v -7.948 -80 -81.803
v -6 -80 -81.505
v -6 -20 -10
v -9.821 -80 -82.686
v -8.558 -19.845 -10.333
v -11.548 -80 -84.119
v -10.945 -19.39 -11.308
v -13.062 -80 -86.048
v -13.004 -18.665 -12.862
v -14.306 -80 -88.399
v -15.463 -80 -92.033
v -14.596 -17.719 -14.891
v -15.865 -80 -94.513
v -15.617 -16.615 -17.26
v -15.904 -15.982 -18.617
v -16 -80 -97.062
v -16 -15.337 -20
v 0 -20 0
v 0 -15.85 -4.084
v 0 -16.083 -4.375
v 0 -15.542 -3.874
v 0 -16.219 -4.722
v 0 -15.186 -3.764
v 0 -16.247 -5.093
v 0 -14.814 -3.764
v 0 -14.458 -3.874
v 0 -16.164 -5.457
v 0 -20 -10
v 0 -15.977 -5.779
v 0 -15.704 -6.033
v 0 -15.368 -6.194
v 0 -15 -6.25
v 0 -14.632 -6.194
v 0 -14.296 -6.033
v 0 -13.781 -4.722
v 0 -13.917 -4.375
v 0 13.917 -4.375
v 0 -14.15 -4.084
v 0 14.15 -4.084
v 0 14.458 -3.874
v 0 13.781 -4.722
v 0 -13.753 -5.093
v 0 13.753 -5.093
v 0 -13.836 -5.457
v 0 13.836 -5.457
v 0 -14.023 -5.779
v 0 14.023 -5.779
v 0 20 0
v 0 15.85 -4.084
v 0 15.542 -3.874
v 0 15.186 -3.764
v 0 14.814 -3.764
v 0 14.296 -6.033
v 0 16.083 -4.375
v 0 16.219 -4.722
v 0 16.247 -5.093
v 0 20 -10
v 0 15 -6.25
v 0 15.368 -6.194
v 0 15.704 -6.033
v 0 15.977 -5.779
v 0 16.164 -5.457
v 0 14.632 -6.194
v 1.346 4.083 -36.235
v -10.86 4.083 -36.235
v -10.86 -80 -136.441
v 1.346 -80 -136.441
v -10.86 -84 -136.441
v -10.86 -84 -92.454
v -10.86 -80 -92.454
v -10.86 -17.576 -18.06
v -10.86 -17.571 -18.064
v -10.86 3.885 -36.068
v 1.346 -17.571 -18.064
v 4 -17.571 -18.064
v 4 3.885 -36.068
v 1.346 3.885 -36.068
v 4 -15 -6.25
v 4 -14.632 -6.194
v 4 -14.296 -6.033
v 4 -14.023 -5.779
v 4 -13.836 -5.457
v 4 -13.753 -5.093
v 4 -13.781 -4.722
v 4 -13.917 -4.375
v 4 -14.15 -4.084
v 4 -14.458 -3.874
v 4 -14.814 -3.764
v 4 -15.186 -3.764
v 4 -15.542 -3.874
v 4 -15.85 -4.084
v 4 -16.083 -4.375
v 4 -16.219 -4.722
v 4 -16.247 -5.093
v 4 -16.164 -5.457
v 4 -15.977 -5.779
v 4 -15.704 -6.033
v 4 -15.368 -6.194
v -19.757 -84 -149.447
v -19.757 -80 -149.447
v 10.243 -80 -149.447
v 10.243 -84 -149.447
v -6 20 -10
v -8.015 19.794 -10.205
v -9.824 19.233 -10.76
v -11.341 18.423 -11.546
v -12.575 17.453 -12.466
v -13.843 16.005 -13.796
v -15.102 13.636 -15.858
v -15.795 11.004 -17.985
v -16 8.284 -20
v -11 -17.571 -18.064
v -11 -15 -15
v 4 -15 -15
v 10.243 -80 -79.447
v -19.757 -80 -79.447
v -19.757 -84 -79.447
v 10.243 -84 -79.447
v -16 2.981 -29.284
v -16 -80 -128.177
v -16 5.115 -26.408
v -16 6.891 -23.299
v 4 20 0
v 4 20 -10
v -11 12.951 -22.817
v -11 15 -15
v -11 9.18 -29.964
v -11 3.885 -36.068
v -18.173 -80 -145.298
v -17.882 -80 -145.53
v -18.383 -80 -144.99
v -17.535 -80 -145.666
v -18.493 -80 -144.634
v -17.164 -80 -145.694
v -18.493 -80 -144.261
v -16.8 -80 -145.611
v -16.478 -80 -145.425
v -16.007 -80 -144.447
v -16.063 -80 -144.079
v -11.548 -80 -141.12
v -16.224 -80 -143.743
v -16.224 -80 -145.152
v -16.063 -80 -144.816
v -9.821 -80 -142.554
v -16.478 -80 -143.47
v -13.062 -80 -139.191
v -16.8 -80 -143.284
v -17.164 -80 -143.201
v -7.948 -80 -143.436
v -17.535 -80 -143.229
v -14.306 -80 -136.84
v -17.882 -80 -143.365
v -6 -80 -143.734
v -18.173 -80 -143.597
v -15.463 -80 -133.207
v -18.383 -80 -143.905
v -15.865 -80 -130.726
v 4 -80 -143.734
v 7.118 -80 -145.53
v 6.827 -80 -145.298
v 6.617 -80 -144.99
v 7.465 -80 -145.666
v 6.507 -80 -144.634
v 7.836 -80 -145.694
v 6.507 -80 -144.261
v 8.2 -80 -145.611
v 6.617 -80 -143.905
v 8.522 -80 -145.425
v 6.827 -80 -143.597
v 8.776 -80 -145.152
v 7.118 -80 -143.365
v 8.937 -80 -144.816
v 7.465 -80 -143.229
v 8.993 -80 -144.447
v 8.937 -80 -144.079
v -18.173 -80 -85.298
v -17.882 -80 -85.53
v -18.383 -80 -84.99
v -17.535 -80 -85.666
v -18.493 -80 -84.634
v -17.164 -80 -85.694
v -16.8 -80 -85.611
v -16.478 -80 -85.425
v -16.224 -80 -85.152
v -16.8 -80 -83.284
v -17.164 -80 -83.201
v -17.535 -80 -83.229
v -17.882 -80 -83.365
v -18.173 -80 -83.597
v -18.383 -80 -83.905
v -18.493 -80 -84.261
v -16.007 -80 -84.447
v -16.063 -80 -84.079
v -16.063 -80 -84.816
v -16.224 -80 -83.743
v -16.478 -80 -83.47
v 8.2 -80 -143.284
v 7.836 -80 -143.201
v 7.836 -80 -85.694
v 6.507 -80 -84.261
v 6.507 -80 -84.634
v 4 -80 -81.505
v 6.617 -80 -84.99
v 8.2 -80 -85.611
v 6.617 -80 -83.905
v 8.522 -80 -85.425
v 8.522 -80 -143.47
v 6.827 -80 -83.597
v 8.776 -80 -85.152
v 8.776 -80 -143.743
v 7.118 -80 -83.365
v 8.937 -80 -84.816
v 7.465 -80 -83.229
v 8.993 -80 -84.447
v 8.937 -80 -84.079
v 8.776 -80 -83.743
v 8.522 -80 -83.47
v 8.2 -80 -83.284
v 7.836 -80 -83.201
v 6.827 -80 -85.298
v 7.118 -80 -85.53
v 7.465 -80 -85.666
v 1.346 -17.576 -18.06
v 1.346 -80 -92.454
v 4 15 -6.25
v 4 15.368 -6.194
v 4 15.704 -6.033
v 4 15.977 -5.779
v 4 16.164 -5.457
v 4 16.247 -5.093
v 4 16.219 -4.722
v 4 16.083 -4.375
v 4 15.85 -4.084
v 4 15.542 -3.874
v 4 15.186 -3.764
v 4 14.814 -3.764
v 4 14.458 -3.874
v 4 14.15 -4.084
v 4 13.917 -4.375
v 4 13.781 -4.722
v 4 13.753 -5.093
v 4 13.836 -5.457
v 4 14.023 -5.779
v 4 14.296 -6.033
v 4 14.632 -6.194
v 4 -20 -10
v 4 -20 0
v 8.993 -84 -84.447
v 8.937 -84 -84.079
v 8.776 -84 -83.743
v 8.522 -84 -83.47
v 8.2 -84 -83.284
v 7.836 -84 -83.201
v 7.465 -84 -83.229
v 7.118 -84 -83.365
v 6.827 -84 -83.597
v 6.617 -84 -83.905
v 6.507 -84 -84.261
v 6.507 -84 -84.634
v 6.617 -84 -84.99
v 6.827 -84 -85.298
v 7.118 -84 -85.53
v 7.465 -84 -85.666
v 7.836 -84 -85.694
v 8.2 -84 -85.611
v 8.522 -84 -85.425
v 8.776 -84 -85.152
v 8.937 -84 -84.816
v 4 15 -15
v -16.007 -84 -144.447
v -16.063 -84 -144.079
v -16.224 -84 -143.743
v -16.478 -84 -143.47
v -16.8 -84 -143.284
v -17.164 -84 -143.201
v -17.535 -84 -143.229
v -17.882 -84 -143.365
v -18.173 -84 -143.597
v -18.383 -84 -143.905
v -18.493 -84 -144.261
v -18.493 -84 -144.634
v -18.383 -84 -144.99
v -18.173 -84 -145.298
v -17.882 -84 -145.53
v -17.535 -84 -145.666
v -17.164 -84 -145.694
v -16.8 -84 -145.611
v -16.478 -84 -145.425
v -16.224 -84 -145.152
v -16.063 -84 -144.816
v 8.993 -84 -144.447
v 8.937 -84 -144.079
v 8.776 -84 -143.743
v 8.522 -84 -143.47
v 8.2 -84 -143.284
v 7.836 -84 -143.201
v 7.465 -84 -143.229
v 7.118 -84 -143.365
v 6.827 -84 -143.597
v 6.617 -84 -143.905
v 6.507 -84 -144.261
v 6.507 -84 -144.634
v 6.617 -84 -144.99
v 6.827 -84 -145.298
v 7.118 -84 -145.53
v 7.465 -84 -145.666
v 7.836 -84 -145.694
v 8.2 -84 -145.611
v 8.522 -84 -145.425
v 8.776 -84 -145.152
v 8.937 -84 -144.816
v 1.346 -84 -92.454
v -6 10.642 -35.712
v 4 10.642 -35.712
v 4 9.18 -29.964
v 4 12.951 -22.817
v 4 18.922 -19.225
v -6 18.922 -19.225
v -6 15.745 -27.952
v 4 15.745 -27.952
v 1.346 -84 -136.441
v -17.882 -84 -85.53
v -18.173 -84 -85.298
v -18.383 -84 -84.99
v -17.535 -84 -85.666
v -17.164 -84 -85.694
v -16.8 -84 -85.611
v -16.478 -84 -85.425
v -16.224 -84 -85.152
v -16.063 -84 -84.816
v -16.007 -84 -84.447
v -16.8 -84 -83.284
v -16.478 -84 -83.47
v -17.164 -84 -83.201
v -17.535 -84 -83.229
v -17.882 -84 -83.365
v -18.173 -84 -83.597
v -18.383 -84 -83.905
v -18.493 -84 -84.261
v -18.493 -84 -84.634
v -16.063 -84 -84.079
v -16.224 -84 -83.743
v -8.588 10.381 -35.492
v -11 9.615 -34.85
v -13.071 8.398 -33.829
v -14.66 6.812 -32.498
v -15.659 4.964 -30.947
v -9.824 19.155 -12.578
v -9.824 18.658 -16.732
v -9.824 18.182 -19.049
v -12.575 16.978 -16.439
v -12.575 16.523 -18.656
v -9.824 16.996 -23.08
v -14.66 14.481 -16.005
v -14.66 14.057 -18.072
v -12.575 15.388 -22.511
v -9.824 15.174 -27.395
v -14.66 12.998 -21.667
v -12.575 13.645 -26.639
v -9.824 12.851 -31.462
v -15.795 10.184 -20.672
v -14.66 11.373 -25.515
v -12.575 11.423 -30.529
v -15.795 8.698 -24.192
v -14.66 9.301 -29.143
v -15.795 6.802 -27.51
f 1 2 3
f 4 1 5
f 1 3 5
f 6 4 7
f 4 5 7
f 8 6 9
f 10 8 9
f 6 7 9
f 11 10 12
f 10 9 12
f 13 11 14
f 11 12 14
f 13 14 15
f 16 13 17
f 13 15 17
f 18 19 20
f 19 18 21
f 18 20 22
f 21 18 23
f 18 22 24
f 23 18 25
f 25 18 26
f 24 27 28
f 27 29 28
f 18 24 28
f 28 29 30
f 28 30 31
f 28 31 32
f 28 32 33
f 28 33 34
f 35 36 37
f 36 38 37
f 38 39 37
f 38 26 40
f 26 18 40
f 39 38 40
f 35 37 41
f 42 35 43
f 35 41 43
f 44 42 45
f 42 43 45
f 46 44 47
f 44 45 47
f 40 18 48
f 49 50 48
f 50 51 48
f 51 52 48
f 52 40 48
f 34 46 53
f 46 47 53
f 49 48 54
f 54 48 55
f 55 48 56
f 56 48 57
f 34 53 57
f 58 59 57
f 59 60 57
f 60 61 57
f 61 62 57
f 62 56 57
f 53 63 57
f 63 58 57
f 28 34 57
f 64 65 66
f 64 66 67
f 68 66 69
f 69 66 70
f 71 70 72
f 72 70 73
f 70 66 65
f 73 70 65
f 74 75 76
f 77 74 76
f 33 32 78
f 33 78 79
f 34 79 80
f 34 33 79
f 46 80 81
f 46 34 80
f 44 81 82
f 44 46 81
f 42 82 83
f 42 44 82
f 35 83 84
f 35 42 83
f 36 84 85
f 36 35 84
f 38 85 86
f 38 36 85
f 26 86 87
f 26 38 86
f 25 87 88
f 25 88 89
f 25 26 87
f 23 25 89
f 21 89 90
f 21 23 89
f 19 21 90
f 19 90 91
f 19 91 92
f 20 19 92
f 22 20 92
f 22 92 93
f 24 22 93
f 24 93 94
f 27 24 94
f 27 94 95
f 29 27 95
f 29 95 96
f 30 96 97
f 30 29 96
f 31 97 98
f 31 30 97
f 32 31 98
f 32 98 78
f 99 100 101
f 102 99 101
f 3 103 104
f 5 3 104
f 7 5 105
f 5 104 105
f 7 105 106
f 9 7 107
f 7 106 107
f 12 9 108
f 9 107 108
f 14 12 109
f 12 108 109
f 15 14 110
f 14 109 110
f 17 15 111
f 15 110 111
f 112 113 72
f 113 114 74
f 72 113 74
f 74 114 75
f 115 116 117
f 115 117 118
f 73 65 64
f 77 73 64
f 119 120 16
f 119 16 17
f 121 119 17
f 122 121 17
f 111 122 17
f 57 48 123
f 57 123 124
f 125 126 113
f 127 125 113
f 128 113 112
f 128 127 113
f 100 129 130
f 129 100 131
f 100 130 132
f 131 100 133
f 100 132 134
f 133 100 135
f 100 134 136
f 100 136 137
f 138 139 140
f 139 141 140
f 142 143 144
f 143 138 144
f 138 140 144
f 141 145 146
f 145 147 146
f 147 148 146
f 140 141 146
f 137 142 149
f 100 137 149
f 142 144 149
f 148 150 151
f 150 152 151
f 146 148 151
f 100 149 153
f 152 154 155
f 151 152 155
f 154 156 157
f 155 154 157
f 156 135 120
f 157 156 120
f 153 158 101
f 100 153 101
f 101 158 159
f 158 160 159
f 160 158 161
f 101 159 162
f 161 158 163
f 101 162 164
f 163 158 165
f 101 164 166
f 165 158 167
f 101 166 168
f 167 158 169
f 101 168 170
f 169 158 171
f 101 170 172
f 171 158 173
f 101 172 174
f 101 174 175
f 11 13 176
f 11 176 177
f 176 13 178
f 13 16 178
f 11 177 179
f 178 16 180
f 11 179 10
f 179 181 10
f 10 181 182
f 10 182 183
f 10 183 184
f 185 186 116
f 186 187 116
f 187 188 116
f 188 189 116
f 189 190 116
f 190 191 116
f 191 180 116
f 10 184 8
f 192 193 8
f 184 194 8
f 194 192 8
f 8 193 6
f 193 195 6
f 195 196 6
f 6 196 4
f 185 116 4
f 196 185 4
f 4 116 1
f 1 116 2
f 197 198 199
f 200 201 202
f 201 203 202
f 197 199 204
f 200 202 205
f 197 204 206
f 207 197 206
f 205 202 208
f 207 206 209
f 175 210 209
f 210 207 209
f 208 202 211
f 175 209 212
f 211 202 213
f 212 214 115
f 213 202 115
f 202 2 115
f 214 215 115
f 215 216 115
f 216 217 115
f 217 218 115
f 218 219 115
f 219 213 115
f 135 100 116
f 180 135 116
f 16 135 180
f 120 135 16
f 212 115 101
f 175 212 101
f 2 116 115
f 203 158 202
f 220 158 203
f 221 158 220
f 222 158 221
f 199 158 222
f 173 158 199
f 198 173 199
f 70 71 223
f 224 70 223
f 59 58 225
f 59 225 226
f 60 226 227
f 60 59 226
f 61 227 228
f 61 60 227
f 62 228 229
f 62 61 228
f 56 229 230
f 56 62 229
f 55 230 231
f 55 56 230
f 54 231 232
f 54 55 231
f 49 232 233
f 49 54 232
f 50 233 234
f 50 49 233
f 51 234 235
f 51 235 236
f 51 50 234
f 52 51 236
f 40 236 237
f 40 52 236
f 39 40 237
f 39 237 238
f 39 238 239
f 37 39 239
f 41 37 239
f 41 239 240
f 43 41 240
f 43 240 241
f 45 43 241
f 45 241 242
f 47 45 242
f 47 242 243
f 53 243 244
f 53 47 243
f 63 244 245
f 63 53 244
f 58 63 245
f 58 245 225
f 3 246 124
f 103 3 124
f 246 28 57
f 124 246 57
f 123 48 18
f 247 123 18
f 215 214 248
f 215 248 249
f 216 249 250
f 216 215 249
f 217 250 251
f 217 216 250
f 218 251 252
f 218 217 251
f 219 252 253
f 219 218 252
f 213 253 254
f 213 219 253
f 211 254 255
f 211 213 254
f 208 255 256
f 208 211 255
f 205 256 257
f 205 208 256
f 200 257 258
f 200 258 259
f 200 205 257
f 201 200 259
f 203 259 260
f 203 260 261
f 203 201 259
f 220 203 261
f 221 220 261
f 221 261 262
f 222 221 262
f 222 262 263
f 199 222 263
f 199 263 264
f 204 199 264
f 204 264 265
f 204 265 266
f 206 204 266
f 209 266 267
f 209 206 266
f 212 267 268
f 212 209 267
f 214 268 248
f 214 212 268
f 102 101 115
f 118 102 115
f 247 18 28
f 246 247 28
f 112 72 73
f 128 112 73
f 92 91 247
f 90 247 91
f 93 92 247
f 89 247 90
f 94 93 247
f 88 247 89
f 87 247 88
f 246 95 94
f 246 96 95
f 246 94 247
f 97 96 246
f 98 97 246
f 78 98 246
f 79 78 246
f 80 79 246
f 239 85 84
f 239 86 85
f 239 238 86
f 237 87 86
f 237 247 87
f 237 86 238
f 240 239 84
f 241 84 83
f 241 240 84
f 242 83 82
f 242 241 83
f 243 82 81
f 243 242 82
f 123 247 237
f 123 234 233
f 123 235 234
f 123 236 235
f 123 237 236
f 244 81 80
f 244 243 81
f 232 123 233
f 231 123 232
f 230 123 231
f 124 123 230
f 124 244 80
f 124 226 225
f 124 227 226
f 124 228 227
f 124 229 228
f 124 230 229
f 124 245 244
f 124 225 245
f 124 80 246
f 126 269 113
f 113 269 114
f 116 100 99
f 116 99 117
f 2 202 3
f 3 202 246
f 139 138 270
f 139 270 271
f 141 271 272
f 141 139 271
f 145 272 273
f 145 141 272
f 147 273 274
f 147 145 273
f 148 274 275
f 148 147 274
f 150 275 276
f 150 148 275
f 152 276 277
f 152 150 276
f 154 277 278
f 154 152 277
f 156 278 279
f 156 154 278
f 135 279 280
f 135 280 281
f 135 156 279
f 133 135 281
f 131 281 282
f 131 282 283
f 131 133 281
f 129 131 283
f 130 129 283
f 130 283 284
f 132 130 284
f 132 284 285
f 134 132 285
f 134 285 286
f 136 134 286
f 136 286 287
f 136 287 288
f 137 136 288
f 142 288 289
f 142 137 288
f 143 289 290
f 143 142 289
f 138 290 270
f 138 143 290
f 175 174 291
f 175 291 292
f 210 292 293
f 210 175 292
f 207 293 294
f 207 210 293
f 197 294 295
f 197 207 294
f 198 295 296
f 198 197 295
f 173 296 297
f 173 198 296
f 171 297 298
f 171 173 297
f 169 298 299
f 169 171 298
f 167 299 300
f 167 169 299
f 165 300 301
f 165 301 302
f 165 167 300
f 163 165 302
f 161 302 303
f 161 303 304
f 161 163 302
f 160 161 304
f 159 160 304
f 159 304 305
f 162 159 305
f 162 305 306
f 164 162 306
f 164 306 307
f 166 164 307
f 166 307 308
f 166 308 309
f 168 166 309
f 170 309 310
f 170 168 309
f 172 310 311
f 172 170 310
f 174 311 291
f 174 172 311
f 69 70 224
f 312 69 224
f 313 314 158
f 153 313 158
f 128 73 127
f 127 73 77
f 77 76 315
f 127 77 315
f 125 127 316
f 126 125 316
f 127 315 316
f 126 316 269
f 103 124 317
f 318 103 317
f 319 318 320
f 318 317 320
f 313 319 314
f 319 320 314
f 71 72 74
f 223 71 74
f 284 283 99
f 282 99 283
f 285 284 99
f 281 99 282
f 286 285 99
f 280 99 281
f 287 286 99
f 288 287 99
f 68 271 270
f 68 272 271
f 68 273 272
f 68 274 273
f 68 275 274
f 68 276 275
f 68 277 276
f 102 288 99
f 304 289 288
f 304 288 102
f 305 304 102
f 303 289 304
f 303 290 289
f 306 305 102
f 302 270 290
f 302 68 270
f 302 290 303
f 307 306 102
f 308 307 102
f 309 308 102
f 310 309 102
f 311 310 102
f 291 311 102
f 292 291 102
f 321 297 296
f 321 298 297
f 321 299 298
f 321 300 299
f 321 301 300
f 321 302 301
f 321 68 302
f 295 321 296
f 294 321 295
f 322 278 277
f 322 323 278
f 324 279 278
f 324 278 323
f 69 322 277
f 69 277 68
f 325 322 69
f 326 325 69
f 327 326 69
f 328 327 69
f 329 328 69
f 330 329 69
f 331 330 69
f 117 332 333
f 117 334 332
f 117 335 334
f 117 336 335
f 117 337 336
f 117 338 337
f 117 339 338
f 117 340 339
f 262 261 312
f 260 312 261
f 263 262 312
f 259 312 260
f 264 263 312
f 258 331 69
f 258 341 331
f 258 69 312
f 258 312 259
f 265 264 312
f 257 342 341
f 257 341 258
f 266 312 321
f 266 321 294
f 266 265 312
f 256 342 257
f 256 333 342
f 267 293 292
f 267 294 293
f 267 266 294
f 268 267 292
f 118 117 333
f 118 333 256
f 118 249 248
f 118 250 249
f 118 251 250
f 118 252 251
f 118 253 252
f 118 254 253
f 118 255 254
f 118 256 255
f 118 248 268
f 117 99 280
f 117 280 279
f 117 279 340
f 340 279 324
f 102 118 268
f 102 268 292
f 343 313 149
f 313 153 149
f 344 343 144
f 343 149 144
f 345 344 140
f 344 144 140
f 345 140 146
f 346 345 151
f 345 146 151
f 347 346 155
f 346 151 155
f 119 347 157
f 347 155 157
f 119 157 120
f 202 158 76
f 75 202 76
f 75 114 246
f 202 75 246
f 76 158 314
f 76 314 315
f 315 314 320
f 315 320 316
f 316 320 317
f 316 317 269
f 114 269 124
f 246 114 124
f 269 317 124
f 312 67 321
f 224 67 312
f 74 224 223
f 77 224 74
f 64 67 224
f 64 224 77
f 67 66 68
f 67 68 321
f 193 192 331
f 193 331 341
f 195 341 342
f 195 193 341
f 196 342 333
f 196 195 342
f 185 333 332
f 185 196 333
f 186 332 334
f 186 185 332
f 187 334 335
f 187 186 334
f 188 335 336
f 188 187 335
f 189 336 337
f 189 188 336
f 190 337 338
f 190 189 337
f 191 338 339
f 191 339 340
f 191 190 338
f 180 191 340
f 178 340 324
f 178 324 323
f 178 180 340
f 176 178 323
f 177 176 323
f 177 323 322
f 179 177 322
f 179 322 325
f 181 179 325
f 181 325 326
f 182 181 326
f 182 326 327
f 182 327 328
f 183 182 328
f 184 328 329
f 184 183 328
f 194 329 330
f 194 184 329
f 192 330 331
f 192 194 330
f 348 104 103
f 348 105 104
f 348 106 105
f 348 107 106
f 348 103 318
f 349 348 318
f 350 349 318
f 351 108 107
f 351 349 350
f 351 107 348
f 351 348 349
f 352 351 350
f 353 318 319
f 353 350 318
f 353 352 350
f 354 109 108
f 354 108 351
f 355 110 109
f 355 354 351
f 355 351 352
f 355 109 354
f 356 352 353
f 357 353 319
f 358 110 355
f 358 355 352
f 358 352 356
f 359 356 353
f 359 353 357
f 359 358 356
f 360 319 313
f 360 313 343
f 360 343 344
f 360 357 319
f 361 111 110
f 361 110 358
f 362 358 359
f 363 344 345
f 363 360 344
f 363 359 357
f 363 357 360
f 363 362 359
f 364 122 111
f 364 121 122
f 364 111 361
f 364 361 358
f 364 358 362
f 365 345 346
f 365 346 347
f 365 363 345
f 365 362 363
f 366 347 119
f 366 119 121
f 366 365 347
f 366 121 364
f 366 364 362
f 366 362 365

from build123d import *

# Parameters (mm, degrees)
SKETCH1_W           = 10
SKETCH1_H           = 20
SKETCH1_R           = 1.25
BOSS_EXTRUDE1_DEPTH = 4
BOSS_EXTRUDE2_DEPTH = 20
FILLET2_R           = 10
SKETCH3_R           = 1.25
CUT_EXTRUDE1_DEPTH  = 15
SKETCH4_W           = 12.205542936
SKETCH4_H           = 28.274710975
CUT_EXTRUDE2_DEPTH  = 137.397289148
SKETCH5_W           = 30
SKETCH5_H           = 70
SKETCH5_R           = 1.25
SKETCH5_W_2         = 12.205542936
SKETCH5_H_2         = 43.987641562
BOSS_EXTRUDE3_DEPTH = 4


with BuildPart() as part:
    # Sketch1 → Boss-Extrude1 (new body)
    with BuildSketch(Plane(origin=(0, 0, 0), x_dir=(0, 0, -1), z_dir=(1, 0, 0))):
        with Locations((5, -10)):
            Rectangle(SKETCH1_W, SKETCH1_H)
        with Locations((5, -15)):
            Circle(SKETCH1_R, mode=Mode.SUBTRACT)
        with Locations((5, 10)):
            Rectangle(SKETCH1_W, SKETCH1_H)
        with Locations((5, 15)):
            Circle(SKETCH1_R, mode=Mode.SUBTRACT)
    extrude(amount=BOSS_EXTRUDE1_DEPTH)


with BuildPart() as body_2:
    # Sketch2 → Boss-Extrude2 (new body)
    with BuildSketch(Plane(origin=(4, 0, 0), x_dir=(0, 0, -1), z_dir=(1, 0, 0))):
        with BuildLine():
            ThreePointArc((10, 20), (23.680805733, 17.587704831), (35.711504387, 10.641777725))
            Line((35.711504387, 10.641777725), (143.73416863, -80))
            Line((143.73416863, -80), (81.505215556, -80))
            Line((81.505215556, -80), (10, -20))
            Line((10, -20), (10, 20))
        make_face()
    extrude(amount=-BOSS_EXTRUDE2_DEPTH)

    # Fillet2
    fillet2_edges = [body_2.edges().sort_by_distance(p)[0] for p in [
        (-16, 0, -10),
        (-16, -50, -45.752607778),
        (-16, -34.679111138, -89.722836509),
        (-16, 17.587704831, -23.680805733),
    ]]
    fillet(fillet2_edges, radius=FILLET2_R)

    # Sketch3 → Cut-Extrude1 (cut)
    with BuildSketch(Plane(origin=(4, 0, 0), x_dir=(0, 0, -1), z_dir=(1, 0, 0))):
        with Locations((5, -15)):
            Circle(SKETCH3_R)
        with Locations((5, 15)):
            Circle(SKETCH3_R)
        with BuildLine():
            Line((15, 15), (15, -15))
            Line((15, -15), (18.064177772, -17.571150439))
            Line((18.064177772, -17.571150439), (36.067703055, 3.884615497))
            ThreePointArc((36.067703055, 3.884615497), (26.498135848, 11.269977831), (15, 15))
        make_face()
    extrude(amount=-CUT_EXTRUDE1_DEPTH, mode=Mode.SUBTRACT)

    # Sketch4 → Cut-Extrude2 (cut, through all)
    with BuildSketch(Plane(origin=(0, -16.154847254, -19.252597253), x_dir=(1, 0, 0), z_dir=(0, 0.64278761, 0.766044443))):
        with Locations((-4.757097635, 12.281851889)):
            Rectangle(SKETCH4_W, SKETCH4_H)
    extrude(amount=-CUT_EXTRUDE2_DEPTH, mode=Mode.SUBTRACT)

    # Sketch5 → Boss-Extrude3 (add)
    with BuildSketch(Plane.XZ.offset(80)):
        with Locations((-4.757097635, -114.447457028)):
            Rectangle(SKETCH5_W, SKETCH5_H)
        with Locations((-17.257097635, -84.447457028)):
            Circle(SKETCH5_R, mode=Mode.SUBTRACT)
        with Locations((7.742902365, -84.447457028)):
            Circle(SKETCH5_R, mode=Mode.SUBTRACT)
        with Locations((7.742902365, -144.447457028)):
            Circle(SKETCH5_R, mode=Mode.SUBTRACT)
        with Locations((-17.257097635, -144.447457028)):
            Circle(SKETCH5_R, mode=Mode.SUBTRACT)
        with Locations((-4.757097635, -114.447457028)):
            Rectangle(SKETCH5_W_2, SKETCH5_H_2, mode=Mode.SUBTRACT)
    extrude(amount=BOSS_EXTRUDE3_DEPTH)


solid = Compound([part.part, body_2.part])
